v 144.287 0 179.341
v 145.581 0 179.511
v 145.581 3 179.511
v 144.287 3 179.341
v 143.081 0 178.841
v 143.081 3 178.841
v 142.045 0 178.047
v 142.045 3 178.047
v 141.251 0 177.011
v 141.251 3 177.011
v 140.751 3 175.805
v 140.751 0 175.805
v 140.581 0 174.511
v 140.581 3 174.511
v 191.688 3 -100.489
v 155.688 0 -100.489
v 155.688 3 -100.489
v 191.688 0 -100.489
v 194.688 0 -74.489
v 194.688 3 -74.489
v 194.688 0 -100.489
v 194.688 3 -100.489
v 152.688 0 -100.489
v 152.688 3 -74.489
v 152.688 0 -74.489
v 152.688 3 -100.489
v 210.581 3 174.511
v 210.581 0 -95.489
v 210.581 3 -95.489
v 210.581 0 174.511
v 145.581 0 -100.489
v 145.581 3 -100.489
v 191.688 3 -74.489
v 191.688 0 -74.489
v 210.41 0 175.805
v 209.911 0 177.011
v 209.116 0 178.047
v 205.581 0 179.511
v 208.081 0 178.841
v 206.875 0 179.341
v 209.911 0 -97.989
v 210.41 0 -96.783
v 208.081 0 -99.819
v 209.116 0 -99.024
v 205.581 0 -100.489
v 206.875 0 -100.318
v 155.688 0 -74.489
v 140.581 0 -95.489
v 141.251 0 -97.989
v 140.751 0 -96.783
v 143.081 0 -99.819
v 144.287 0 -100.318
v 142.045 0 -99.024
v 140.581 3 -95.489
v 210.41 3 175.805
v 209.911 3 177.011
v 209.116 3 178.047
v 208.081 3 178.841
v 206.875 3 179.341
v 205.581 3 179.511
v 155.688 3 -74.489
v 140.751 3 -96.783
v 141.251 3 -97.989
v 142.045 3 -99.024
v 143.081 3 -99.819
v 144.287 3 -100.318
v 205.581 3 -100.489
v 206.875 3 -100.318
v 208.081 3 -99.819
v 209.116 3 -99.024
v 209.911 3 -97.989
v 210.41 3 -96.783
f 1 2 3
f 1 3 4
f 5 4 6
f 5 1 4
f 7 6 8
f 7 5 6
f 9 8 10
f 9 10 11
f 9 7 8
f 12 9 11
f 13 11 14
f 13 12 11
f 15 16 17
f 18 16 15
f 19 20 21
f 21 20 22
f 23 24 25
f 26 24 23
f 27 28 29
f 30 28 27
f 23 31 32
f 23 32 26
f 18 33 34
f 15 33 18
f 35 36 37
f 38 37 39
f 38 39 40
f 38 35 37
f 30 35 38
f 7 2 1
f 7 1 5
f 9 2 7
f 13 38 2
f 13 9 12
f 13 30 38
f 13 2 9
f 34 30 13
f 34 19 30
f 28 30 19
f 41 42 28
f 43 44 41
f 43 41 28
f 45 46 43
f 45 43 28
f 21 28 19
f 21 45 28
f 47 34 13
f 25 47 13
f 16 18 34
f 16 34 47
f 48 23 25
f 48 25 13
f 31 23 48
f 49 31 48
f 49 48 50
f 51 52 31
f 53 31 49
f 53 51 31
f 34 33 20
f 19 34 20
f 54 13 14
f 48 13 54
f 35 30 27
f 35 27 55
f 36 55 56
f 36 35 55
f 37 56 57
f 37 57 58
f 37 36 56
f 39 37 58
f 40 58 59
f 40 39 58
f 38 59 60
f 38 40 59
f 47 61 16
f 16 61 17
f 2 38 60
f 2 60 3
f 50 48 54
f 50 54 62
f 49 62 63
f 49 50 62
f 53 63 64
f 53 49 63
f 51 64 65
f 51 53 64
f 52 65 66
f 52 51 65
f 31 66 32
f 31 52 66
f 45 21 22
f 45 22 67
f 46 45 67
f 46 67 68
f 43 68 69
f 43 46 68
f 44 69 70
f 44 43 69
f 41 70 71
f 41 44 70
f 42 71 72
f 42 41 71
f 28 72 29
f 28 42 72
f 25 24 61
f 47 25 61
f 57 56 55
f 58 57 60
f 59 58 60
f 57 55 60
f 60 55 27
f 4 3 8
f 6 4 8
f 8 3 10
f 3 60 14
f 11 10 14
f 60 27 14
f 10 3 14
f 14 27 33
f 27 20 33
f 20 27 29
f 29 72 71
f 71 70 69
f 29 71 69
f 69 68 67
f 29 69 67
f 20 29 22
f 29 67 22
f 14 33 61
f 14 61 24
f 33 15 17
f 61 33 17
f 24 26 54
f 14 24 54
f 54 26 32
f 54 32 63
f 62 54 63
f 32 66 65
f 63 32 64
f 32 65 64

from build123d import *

# Parameters (mm, degrees)
BOSS_EXTRUDE1_DEPTH = 3
SKETCH2_W           = 3
SKETCH2_H           = 26
CUT_EXTRUDE1_DEPTH  = 4


with BuildPart() as part:
    # Sketch1 → Boss-Extrude1 (new body)
    with BuildSketch(Plane(origin=(0, 0, 0), x_dir=(1, 0, 0), z_dir=(0, 1, 0))):
        with BuildLine():
            Line((145.58070197, 100.48875), (205.58070197, 100.48875))
            ThreePointArc((205.58070197, 100.48875), (209.116235876, 99.024283906), (210.58070197, 95.48875))
            Line((210.58070197, 95.48875), (210.58070197, -174.51125))
            ThreePointArc((210.58070197, -174.51125), (209.116235876, -178.046783906), (205.58070197, -179.51125))
            Line((205.58070197, -179.51125), (145.58070197, -179.51125))
            ThreePointArc((145.58070197, -179.51125), (142.045168065, -178.046783906), (140.58070197, -174.51125))
            Line((140.58070197, -174.51125), (140.58070197, 95.48875))
            ThreePointArc((140.58070197, 95.48875), (142.045168065, 99.024283906), (145.58070197, 100.48875))
        make_face()
    extrude(amount=BOSS_EXTRUDE1_DEPTH)

    # Sketch2 → Cut-Extrude1 (cut, through all)
    with BuildSketch(Plane(origin=(0, 3, 0), x_dir=(1, 0, 0), z_dir=(0, 1, 0))):
        with Locations((154.188003651, 87.48875)):
            Rectangle(SKETCH2_W, SKETCH2_H)
        with Locations((193.188003651, 87.48875)):
            Rectangle(SKETCH2_W, SKETCH2_H)
    extrude(amount=-CUT_EXTRUDE1_DEPTH, mode=Mode.SUBTRACT)


solid = part.part
